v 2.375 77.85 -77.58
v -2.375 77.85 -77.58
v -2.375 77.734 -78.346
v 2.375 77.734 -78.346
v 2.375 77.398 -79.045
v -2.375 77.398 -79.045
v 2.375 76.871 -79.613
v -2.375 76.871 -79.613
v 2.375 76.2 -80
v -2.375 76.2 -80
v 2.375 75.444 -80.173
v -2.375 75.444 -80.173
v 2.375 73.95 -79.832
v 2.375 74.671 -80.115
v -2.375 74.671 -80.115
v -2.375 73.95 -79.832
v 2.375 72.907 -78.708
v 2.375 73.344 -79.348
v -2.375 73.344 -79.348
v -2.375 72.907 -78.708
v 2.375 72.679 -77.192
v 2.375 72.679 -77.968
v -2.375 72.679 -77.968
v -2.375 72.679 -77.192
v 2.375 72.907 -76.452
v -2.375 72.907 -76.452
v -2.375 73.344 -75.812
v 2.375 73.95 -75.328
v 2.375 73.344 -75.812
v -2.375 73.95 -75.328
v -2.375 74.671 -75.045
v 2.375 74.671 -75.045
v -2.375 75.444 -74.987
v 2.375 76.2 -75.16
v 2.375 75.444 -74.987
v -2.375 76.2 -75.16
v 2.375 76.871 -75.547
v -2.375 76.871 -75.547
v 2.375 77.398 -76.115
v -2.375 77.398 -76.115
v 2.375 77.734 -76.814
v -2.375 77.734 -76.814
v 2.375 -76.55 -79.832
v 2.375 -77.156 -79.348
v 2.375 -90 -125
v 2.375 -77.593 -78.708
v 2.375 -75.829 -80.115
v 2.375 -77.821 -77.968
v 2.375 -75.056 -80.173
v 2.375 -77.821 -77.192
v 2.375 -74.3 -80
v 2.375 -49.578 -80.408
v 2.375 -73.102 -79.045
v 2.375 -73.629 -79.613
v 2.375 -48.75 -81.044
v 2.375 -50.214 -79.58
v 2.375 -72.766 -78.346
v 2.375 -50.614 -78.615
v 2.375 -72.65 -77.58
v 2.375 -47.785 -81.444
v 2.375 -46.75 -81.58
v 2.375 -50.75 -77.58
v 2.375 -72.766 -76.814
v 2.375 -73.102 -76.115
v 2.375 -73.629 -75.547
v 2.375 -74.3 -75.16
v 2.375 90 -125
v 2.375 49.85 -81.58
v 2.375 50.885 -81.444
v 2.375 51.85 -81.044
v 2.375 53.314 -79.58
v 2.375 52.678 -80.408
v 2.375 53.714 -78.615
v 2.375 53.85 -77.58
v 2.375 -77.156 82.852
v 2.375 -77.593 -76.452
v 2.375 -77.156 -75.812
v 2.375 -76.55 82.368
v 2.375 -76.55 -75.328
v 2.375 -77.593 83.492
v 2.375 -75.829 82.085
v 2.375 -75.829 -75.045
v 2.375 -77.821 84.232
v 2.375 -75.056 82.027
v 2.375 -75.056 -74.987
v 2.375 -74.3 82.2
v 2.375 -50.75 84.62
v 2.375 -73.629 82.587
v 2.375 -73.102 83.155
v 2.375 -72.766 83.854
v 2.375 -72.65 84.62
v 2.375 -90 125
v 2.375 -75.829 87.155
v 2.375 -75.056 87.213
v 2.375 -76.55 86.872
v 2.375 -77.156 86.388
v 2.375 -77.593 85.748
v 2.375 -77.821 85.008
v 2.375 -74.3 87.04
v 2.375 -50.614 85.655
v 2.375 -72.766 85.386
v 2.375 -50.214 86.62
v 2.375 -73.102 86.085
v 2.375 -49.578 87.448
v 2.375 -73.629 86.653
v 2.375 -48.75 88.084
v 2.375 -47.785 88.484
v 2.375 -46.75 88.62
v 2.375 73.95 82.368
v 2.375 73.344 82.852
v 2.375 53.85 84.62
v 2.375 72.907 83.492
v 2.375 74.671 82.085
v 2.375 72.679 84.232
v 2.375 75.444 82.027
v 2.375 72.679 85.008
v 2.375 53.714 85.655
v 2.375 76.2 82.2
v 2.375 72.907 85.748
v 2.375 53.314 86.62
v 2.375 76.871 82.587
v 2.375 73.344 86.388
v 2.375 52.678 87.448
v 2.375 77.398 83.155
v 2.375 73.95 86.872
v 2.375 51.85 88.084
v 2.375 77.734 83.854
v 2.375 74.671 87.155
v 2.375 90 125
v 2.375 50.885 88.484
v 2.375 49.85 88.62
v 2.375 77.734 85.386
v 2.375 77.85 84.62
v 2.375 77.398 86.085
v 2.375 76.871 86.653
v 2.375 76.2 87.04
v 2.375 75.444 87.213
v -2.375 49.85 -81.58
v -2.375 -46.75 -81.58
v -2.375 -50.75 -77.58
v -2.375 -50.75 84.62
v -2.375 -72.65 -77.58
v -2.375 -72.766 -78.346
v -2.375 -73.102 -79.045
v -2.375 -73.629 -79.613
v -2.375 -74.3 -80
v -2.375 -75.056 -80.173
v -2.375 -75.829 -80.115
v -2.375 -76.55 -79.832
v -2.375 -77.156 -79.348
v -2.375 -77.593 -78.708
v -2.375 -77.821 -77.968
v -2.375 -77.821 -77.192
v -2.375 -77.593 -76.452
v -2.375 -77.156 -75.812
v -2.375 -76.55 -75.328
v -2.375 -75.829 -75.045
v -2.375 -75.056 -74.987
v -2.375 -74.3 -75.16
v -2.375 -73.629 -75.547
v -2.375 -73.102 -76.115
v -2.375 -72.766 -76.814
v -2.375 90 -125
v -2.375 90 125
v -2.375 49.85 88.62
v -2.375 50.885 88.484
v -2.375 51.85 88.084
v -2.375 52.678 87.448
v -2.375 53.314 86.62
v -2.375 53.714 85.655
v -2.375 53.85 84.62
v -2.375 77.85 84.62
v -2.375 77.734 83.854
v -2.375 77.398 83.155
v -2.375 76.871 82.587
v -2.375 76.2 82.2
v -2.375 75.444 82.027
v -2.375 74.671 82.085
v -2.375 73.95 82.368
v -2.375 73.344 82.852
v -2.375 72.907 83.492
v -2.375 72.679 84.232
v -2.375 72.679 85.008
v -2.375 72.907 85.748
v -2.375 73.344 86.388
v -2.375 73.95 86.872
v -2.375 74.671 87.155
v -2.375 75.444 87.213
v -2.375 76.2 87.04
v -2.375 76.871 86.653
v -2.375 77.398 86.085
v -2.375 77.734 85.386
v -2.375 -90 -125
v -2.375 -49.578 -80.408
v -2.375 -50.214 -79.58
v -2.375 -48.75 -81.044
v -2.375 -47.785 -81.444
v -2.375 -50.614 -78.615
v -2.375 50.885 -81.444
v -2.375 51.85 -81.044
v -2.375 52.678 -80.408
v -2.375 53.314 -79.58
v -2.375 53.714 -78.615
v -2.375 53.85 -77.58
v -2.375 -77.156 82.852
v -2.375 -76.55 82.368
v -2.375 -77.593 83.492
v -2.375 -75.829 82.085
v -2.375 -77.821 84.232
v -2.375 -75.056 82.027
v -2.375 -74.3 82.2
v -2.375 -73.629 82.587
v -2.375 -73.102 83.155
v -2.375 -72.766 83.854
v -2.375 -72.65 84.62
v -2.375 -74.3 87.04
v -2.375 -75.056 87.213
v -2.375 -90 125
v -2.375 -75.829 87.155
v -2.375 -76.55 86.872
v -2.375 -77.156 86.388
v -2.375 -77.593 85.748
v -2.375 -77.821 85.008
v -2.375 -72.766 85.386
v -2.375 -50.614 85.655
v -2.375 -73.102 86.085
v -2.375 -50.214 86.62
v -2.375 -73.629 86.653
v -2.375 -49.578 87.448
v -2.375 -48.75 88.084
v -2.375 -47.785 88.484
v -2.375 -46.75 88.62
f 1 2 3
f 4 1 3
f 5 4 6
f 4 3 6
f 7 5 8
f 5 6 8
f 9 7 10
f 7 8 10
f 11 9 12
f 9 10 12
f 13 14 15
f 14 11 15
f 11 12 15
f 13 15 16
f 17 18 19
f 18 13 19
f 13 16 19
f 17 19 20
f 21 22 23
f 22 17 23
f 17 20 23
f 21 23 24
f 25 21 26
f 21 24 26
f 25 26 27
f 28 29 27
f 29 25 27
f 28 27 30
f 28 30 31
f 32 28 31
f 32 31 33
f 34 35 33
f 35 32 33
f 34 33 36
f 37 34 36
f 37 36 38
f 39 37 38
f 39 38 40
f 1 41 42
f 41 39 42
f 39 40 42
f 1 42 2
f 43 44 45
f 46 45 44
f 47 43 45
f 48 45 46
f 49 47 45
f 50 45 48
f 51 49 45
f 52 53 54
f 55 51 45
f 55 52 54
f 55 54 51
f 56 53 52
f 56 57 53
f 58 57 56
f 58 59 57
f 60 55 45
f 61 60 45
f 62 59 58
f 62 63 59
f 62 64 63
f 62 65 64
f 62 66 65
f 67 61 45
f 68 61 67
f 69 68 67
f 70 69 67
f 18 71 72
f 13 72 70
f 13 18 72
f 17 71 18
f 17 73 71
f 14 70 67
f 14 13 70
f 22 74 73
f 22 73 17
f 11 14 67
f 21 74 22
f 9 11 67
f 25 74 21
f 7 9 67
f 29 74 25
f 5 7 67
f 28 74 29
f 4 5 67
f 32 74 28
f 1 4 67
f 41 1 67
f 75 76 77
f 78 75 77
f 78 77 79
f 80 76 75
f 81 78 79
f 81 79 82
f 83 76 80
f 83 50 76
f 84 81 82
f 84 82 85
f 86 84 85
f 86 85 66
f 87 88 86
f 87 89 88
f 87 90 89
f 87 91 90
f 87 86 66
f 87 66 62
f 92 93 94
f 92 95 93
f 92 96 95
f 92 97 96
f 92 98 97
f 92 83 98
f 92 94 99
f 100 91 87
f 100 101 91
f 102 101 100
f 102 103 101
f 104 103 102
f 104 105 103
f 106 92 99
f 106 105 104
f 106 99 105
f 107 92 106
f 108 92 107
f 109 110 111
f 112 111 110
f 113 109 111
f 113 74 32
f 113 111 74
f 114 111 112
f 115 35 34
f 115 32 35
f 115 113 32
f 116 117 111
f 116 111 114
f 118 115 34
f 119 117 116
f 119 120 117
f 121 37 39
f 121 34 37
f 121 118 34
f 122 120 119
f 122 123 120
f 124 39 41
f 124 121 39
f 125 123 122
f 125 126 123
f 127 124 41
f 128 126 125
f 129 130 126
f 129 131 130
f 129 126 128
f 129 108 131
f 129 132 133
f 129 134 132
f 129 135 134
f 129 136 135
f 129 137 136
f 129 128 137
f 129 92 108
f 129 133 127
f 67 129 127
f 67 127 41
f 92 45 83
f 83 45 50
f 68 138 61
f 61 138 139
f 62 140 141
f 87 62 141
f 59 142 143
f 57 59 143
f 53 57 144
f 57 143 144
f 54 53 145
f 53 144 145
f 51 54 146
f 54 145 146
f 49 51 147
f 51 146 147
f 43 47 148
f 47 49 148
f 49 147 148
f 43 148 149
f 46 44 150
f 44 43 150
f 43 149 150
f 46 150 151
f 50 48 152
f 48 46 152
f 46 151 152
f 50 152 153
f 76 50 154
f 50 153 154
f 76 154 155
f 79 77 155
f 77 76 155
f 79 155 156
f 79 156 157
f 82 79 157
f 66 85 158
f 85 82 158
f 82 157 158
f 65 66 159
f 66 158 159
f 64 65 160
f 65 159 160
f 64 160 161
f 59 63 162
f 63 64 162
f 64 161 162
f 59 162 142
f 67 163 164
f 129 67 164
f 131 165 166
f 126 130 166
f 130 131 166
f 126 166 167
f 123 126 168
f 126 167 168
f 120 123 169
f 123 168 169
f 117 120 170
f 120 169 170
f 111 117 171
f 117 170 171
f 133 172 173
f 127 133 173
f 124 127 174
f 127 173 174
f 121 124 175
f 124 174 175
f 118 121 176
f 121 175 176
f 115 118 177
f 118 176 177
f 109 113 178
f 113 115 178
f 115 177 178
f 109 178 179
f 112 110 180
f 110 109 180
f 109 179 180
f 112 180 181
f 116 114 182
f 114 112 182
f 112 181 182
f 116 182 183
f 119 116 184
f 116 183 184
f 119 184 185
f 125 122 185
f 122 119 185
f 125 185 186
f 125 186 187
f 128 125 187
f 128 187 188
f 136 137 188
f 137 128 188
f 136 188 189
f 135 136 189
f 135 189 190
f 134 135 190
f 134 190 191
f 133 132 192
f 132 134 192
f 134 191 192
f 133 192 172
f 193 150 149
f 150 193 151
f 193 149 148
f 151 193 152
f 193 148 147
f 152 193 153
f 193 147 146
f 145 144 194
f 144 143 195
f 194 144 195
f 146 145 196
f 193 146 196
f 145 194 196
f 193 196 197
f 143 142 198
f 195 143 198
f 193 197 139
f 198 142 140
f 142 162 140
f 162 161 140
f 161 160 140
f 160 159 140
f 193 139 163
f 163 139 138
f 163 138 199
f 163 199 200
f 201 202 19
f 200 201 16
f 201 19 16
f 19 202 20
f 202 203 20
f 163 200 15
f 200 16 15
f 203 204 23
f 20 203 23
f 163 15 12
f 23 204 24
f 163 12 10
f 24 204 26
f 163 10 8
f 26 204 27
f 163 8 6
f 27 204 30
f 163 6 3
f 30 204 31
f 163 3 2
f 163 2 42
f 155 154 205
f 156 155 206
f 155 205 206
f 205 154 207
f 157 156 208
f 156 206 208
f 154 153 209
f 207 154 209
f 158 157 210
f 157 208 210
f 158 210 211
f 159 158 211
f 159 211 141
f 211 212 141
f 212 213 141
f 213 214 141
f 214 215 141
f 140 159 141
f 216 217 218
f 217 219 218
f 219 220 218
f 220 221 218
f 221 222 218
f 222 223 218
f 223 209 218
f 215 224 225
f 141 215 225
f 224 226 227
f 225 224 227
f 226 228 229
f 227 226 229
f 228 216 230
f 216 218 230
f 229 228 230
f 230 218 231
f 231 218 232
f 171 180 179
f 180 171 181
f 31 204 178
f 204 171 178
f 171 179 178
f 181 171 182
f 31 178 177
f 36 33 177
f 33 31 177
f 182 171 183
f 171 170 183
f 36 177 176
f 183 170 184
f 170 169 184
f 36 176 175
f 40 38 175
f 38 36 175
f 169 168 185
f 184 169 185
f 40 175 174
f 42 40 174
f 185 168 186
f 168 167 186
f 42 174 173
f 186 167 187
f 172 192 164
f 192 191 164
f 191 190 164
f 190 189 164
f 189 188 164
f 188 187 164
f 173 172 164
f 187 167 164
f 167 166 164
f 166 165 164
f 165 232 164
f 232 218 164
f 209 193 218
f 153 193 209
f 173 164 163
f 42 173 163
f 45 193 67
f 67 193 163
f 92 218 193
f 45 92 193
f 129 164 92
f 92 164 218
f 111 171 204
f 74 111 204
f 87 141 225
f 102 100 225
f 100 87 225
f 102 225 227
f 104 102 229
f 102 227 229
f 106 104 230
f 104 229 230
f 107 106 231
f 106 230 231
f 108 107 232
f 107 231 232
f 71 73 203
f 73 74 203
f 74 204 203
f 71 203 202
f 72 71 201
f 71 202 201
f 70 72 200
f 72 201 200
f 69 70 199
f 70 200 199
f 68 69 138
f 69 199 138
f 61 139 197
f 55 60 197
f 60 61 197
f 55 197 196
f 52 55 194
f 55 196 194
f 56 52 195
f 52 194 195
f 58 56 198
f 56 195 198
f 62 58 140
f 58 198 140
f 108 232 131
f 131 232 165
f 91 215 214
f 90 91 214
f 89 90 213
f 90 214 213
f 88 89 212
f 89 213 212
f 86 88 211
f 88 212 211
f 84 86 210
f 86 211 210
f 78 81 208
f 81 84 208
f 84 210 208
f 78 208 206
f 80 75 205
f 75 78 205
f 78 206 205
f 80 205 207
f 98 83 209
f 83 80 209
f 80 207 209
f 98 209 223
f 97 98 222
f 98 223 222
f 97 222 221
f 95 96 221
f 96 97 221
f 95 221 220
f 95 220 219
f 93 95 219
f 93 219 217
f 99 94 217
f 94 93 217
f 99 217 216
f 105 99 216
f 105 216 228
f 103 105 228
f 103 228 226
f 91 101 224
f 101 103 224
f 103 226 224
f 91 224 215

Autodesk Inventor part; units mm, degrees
ref_plane "YZ Plane" through (0, 0, 0) normal (1, 0, 0) x (0, 1, 0)
ref_plane "XZ Plane" through (0, 0, 0) normal (0, 1, 0) x (-1, 0, 0)
ref_plane "XY Plane" through (0, 0, 0) normal (0, 0, 1) x (1, 0, 0)
sketch "Face" plane through (0, 0, 0) normal (0, 0, 1) x (1, 0, 0)
  line L0 (38.5, 208.87) -> (135.1, 208.87)
  arc A0 (38.5, 208.87) -> (34.5, 204.87) centre (38.5, 204.87) ccw
  circle A1 centre (10, 204.87) radius 2.6
  line L1 (175.25, 245.25) -> (-4.75, 245.25)
  line L2 (139.1, 204.87) -> (139.1, 42.67)
  line L3 (34.5, 42.67) -> (34.5, 204.87)
  line L4 (175.25, -4.75) -> (175.25, 245.25)
  line L5 (-4.75, 245.25) -> (-4.75, -4.75)
  circle A2 centre (160.5, 42.67) radius 2.6
  arc A3 (135.1, 38.67) -> (139.1, 42.67) centre (135.1, 42.67) ccw
  arc A4 (34.5, 42.67) -> (38.5, 38.67) centre (38.5, 42.67) ccw
  circle A5 centre (10, 42.67) radius 2.6
  line L6 (-4.75, -4.75) -> (175.25, -4.75)
  line L7 (135.1, 38.67) -> (38.5, 38.67)
  arc A6 (139.1, 204.87) -> (135.1, 208.87) centre (135.1, 204.87) ccw
  circle A7 centre (160.5, 204.87) radius 2.6
  point P0 (84.3959, 120.382)
  point P1 (0, 0)
sketch "Sketch1" plane through (0, 0, 0) normal (1, 0, 0) x (0, 1, 0)
  line L0 (-46.75, 88.62) -> (49.85, 88.62)
  arc A0 (-46.75, 88.62) -> (-50.75, 84.62) centre (-46.75, 84.62) ccw
  circle A1 centre (-75.25, 84.62) radius 2.6
  line L1 (90, 125) -> (-90, 125)
  line L2 (53.85, 84.62) -> (53.85, -77.58)
  line L3 (-50.75, -77.58) -> (-50.75, 84.62)
  line L4 (90, -125) -> (90, 125)
  line L5 (-90, 125) -> (-90, -125)
  circle A2 centre (75.25, -77.58) radius 2.6
  arc A3 (49.85, -81.58) -> (53.85, -77.58) centre (49.85, -77.58) ccw
  arc A4 (-50.75, -77.58) -> (-46.75, -81.58) centre (-46.75, -77.58) ccw
  circle A5 centre (-75.25, -77.58) radius 2.6
  line L6 (-90, -125) -> (90, -125)
  line L7 (49.85, -81.58) -> (-46.75, -81.58)
  arc A6 (53.85, 84.62) -> (49.85, 88.62) centre (49.85, 84.62) ccw
  circle A7 centre (75.25, 84.62) radius 2.6
  point P0 (0, 0)
  point P1 (0, 125)
  point P2 (90, 0)
extrude "Extrusion1" add sketch "Sketch1" along normal mid plane 4.75
properties part number "BREEZE-M06"
